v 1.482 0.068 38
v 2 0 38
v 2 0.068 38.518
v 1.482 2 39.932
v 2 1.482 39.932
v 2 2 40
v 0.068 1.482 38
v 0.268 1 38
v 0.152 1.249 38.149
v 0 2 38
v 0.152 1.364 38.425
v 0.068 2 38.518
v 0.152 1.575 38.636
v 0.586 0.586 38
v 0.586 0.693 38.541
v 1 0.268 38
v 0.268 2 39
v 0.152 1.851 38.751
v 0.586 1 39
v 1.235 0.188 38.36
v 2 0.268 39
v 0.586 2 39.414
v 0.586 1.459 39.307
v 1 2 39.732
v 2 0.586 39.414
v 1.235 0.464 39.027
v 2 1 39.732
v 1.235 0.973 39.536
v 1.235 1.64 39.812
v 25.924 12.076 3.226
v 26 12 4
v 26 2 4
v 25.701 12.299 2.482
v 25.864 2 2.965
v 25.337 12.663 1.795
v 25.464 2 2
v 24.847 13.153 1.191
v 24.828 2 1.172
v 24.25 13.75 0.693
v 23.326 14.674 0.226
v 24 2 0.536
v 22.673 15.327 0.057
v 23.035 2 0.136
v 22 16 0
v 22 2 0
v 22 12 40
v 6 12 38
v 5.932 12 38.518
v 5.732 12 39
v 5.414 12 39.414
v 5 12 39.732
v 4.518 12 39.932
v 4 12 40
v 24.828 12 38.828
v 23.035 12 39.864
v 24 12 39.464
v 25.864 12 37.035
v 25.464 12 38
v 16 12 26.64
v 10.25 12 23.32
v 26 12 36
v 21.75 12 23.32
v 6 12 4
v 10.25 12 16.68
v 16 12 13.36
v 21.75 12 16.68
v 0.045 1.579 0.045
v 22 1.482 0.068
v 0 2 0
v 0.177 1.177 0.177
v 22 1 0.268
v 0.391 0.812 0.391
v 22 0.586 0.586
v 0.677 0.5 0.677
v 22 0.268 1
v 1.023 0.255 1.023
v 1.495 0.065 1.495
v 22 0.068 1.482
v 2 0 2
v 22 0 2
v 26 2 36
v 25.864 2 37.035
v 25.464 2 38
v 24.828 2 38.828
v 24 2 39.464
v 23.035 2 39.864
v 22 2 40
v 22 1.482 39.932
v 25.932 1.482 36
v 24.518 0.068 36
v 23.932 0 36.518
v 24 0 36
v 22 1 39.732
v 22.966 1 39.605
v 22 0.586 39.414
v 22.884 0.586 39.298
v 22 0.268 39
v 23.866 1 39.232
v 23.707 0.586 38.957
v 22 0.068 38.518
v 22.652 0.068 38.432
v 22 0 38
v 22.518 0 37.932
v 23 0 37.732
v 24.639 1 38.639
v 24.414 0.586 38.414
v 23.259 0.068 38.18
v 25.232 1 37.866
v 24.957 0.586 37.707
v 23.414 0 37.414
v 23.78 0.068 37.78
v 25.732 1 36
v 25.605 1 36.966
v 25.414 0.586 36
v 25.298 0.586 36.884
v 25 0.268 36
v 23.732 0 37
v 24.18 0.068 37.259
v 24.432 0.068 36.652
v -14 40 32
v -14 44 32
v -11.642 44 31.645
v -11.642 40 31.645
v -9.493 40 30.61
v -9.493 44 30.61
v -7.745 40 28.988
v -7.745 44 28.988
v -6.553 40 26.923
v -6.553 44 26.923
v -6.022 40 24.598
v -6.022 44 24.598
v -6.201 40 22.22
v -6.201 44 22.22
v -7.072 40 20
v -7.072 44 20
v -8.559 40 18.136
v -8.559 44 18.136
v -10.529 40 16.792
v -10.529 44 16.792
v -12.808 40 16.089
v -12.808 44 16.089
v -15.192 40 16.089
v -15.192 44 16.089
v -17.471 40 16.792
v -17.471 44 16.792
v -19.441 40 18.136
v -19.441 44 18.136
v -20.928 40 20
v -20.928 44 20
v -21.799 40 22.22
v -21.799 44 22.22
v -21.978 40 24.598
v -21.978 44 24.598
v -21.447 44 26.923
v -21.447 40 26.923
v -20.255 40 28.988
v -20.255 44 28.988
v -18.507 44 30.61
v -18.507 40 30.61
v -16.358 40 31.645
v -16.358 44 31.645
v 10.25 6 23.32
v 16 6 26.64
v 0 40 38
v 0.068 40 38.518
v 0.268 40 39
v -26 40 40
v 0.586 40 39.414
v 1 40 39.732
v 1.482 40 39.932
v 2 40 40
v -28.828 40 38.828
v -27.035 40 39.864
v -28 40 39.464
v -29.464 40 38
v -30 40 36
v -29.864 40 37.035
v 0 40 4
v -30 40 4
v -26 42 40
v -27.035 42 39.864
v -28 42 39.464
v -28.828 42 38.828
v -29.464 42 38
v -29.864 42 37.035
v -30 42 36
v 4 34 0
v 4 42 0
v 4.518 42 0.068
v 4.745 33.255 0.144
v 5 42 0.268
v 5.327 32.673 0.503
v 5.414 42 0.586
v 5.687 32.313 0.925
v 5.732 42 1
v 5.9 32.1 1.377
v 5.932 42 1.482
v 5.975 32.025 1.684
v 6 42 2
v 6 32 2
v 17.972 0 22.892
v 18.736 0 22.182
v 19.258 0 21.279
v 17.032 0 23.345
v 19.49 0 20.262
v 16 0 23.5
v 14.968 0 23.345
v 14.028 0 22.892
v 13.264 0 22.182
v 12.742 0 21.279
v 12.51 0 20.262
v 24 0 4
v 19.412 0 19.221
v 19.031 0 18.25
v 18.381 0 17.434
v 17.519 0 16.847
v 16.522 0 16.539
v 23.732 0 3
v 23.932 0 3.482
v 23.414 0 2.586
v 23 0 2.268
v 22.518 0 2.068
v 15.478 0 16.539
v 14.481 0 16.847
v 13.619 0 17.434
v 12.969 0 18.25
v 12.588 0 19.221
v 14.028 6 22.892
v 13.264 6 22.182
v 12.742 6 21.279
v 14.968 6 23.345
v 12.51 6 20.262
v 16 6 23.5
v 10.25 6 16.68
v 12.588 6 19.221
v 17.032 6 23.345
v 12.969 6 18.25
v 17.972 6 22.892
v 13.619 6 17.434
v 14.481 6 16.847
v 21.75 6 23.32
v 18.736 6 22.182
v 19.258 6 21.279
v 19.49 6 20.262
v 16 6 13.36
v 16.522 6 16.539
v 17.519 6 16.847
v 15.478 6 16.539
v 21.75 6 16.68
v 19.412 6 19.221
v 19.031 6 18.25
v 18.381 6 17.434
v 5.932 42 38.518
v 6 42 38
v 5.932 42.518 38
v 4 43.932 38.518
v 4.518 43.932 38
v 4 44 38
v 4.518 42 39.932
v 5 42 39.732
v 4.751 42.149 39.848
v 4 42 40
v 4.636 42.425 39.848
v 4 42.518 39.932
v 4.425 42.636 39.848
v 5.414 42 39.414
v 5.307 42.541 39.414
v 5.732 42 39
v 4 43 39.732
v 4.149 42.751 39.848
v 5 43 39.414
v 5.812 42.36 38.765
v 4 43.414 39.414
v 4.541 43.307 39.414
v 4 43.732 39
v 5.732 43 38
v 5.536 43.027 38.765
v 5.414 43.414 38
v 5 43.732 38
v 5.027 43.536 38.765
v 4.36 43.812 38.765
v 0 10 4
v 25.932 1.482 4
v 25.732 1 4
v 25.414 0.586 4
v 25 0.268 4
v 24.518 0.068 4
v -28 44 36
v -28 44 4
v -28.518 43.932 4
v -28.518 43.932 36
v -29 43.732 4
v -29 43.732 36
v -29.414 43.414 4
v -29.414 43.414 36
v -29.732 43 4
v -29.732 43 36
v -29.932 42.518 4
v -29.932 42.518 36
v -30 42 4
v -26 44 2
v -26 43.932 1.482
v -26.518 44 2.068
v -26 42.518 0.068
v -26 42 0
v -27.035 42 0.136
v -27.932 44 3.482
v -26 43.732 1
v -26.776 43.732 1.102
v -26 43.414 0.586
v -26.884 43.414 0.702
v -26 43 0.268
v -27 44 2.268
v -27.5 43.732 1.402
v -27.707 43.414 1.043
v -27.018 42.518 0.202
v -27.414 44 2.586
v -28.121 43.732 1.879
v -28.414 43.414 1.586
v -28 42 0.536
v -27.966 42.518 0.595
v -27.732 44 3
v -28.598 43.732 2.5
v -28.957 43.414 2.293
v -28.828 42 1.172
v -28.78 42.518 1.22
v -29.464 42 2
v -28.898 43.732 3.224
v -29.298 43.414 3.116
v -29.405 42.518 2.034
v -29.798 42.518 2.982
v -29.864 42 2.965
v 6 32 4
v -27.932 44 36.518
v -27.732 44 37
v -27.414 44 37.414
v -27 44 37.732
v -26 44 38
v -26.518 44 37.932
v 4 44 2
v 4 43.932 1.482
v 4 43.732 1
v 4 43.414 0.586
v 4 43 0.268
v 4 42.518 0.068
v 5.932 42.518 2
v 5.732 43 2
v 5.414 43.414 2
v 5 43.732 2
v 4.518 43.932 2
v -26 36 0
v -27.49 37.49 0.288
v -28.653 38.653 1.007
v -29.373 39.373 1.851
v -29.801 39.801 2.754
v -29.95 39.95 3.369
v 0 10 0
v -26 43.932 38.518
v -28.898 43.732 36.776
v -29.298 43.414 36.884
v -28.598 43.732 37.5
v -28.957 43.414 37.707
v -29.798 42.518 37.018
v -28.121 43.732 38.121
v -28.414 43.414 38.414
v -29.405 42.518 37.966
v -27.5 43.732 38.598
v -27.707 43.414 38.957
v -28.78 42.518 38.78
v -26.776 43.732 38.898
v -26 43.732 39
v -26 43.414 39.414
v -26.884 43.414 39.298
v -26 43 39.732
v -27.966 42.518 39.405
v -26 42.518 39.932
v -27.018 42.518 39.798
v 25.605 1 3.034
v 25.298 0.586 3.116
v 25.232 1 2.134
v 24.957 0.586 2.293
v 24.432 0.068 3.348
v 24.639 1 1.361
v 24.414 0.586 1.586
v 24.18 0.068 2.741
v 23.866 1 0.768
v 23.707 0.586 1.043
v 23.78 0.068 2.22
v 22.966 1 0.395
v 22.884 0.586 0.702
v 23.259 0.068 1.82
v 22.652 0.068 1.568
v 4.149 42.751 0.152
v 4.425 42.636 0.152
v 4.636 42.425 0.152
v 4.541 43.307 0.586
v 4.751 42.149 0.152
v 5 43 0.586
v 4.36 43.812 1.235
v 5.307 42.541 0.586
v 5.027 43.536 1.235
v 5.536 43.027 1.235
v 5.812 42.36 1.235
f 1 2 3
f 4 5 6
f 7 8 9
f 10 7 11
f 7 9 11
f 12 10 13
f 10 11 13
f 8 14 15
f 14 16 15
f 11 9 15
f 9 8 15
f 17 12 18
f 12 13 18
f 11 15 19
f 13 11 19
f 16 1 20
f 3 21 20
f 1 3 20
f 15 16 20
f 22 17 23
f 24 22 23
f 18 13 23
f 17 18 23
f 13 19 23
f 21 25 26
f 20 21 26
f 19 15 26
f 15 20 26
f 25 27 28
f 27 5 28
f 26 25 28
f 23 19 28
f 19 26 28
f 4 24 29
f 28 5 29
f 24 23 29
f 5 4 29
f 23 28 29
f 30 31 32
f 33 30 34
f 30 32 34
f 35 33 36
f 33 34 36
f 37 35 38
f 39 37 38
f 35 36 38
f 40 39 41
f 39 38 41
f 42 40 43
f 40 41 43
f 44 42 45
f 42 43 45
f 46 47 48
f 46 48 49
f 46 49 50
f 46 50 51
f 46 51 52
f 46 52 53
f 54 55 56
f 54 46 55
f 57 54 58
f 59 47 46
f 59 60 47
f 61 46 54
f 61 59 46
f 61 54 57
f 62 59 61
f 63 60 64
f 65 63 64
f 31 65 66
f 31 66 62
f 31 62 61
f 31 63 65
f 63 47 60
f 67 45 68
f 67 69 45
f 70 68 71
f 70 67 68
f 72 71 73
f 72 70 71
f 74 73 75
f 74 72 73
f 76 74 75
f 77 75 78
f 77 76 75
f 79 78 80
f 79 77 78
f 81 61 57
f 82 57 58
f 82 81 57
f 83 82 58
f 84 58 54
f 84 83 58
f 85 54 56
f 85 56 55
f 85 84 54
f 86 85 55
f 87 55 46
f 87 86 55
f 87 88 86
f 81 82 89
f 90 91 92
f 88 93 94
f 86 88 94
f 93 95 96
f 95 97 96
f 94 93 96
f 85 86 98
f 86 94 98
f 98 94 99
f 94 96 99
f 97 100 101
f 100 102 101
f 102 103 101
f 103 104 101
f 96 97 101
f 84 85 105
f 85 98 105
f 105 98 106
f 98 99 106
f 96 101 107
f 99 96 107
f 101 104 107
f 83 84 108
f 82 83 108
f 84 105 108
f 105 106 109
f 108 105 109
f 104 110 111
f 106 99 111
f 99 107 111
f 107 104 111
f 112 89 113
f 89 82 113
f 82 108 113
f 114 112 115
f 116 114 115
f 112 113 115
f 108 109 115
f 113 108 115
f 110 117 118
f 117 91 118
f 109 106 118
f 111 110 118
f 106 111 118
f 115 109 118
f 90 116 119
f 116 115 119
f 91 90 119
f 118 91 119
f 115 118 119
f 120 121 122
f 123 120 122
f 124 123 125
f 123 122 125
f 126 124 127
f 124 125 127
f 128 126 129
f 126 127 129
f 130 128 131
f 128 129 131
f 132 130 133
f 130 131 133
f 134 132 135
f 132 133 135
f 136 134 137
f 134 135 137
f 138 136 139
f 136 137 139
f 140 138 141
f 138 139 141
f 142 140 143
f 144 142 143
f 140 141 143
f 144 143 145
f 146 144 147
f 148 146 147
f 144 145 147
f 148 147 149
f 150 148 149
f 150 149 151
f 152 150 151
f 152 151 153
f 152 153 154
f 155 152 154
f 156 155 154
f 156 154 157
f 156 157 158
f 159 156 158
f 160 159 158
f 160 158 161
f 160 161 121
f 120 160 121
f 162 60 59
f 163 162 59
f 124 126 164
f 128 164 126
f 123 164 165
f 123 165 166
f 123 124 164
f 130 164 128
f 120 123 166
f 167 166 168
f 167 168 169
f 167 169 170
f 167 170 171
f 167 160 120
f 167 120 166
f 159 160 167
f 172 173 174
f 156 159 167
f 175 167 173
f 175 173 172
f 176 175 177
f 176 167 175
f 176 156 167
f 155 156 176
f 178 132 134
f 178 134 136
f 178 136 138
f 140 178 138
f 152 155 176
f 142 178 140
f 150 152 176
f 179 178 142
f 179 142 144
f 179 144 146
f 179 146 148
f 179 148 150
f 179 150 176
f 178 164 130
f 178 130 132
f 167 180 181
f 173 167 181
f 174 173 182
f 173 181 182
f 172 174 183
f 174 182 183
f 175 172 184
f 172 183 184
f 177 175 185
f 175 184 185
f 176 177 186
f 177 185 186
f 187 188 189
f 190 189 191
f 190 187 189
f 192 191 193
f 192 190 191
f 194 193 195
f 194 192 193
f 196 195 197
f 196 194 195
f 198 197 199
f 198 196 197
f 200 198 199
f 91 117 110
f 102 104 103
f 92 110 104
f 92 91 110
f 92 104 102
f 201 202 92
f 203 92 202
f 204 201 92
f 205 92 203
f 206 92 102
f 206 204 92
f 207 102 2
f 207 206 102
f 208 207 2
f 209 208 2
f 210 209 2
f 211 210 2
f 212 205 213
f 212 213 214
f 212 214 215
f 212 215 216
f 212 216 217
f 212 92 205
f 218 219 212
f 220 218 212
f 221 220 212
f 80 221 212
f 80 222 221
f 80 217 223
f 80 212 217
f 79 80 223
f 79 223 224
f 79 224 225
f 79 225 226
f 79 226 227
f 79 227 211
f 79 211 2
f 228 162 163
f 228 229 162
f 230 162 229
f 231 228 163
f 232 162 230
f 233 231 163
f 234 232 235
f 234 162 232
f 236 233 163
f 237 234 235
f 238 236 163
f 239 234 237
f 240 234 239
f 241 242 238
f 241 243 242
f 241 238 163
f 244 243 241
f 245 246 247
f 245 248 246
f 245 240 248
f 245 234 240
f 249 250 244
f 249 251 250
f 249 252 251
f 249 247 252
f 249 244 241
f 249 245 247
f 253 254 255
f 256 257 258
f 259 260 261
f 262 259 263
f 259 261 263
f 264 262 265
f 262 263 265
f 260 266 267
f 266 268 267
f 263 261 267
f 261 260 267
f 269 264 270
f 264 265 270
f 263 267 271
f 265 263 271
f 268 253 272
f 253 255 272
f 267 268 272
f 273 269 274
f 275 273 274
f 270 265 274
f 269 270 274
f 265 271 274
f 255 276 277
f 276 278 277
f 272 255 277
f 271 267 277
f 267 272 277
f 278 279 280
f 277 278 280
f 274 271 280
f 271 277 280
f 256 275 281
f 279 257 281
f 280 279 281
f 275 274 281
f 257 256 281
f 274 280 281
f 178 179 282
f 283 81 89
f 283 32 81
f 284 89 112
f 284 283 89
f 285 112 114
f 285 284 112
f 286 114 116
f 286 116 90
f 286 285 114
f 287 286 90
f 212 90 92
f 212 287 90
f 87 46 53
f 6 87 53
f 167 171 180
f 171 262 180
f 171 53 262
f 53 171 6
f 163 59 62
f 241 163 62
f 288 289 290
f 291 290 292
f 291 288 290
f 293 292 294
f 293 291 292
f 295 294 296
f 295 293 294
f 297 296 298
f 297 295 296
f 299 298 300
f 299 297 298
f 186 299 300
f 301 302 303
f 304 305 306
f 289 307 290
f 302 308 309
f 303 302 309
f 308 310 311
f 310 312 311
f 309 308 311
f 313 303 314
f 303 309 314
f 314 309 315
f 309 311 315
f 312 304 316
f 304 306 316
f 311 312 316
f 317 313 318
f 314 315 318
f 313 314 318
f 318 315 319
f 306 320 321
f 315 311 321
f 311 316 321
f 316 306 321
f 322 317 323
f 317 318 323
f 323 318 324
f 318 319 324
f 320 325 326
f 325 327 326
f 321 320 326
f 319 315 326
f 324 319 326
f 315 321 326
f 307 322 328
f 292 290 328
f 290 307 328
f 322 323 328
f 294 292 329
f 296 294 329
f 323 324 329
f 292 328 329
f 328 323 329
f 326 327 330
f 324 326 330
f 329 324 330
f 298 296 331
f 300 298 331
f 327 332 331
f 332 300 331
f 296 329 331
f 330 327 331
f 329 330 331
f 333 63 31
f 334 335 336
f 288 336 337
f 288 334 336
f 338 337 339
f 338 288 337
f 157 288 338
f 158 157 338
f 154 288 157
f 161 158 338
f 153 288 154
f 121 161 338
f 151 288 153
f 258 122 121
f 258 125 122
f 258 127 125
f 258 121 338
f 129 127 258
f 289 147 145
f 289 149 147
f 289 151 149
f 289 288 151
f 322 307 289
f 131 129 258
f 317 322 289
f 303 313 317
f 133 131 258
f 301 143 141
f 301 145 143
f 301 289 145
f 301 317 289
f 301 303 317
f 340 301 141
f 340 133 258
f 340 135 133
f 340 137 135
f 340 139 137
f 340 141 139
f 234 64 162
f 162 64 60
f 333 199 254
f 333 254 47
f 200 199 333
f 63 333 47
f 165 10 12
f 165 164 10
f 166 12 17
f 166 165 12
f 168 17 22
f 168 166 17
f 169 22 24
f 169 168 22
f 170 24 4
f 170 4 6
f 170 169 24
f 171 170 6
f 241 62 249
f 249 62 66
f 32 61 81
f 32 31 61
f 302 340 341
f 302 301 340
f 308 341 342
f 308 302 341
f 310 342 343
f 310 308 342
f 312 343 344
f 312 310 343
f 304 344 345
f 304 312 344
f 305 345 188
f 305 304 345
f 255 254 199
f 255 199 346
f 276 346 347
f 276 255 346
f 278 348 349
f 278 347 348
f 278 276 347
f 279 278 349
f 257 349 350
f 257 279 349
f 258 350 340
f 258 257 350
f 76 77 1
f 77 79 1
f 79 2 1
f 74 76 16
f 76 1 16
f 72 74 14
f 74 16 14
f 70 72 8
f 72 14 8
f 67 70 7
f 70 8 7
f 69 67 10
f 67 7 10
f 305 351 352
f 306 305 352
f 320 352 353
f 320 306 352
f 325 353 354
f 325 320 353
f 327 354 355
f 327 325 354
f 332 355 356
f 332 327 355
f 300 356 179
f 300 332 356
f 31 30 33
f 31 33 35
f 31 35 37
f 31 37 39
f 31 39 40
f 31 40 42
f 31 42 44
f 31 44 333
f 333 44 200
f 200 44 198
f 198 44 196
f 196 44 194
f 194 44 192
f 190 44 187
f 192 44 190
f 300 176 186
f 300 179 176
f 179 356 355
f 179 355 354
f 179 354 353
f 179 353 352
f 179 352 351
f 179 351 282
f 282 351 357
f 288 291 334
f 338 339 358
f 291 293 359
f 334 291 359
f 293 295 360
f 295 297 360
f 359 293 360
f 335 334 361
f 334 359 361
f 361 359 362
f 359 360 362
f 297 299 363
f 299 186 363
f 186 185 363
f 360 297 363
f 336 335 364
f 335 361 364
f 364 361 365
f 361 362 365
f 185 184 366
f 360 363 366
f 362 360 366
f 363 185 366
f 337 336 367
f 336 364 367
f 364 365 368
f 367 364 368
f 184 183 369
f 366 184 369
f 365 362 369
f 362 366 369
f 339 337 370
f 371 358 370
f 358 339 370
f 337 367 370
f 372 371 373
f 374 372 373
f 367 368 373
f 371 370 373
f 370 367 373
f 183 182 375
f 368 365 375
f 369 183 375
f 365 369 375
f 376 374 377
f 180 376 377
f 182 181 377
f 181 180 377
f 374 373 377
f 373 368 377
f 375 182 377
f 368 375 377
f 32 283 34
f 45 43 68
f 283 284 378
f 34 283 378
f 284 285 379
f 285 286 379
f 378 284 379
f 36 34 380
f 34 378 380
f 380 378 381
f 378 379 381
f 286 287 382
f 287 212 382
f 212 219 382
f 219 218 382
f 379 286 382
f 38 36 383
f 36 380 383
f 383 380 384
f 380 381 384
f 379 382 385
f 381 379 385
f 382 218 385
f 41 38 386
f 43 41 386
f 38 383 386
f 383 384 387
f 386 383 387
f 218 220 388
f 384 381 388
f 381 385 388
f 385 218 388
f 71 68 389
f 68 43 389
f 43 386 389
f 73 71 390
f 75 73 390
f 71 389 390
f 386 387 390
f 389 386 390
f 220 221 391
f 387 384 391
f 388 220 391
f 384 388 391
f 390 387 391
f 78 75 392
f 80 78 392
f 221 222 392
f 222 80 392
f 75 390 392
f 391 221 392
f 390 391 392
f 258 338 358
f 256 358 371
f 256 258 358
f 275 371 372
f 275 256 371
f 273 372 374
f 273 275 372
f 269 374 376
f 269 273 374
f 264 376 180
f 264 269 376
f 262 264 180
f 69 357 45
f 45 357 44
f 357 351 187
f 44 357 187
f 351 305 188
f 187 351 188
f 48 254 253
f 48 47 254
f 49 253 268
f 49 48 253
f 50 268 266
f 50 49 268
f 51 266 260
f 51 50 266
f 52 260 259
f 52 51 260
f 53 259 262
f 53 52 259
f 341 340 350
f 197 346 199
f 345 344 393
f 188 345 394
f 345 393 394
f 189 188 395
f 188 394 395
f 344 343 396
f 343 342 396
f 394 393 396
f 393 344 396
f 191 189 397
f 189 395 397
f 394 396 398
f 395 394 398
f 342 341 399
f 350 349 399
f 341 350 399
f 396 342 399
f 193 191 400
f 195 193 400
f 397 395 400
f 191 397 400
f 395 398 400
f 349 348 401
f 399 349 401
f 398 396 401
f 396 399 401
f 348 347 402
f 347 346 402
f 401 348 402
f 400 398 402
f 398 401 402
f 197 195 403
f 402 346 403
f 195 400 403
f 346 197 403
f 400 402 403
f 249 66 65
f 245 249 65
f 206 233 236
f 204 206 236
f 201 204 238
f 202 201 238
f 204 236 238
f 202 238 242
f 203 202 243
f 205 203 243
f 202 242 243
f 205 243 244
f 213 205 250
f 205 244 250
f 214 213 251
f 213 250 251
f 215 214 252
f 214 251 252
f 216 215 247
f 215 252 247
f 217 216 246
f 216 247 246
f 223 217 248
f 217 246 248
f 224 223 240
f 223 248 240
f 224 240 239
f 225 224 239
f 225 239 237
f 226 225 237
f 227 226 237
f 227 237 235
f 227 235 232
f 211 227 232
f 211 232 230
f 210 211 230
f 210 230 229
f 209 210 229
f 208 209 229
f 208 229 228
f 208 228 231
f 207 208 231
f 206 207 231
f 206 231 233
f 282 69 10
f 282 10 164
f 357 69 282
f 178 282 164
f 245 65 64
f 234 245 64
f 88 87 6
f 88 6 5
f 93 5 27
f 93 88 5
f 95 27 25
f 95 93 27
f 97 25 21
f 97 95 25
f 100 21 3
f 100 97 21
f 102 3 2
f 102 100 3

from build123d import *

# Parameters (mm, degrees)
BOSS_EXTRUDE1_DEPTH = 40
SKETCH3_R           = 3.5
CUT_EXTRUDE1_DEPTH  = 32
SKETCH2_R           = 8
CUT_EXTRUDE2_DEPTH  = 32
CUT_EXTRUDE3_DEPTH  = 6
BOSS_EXTRUDE3_DEPTH = 4
FILLET1_R           = 4
FILLET4_R           = 2


with BuildPart() as part:
    # Sketch1 → Boss-Extrude1 (new body)
    with BuildSketch(Plane.XY):
        Polygon((0, 0), (0, 40), (-30, 40), (-30, 44), (6, 44), (6, 12), (26, 12), (26, 0), align=None)
    extrude(amount=BOSS_EXTRUDE1_DEPTH)

    # Sketch3 → Cut-Extrude1 (cut)
    with BuildSketch(Plane(origin=(0, 12, 0), x_dir=(1, 0, 0), z_dir=(0, 1, 0))):
        with Locations(Location((16, -20, 0), (0, 0, 270))):
            Circle(SKETCH3_R)
    extrude(amount=-CUT_EXTRUDE1_DEPTH, mode=Mode.SUBTRACT)

    # Sketch2 → Cut-Extrude2 (cut)
    with BuildSketch(Plane(origin=(0, 44, 0), x_dir=(1, 0, 0), z_dir=(0, 1, 0))):
        with Locations(Location((-14, -24, 0), (0, 0, 270))):
            Circle(SKETCH2_R)
    extrude(amount=-CUT_EXTRUDE2_DEPTH, mode=Mode.SUBTRACT)

    # Sketch4 → Cut-Extrude3 (cut)
    with BuildSketch(Plane(origin=(0, 12, 0), x_dir=(1, 0, 0), z_dir=(0, 1, 0))):
        Polygon((16, -26.639528096), (21.75, -23.319764048), (21.75, -16.680235952), (16, -13.360471904), (10.25, -16.680235952), (10.25, -23.319764048), align=None)
    extrude(amount=-CUT_EXTRUDE3_DEPTH, mode=Mode.SUBTRACT)

    # Sketch5 → Boss-Extrude3 (add)
    with BuildSketch(Plane(origin=(0, 0, 0), x_dir=(-1, 0, 0), z_dir=(0, 0, -1))):
        Polygon((-26, 12), (-6, 32), (-6, 12), align=None)
        Polygon((0, 10), (0, 40), (30, 40), align=None)
    extrude(amount=-BOSS_EXTRUDE3_DEPTH)

    # Fillet1
    fillet1_edges = [part.edges().sort_by_distance(p)[0] for p in [
        (26, 6, 0),
        (-30, 42, 40),
        (26, 6, 40),
        (-30, 42, 0),
    ]]
    fillet(fillet1_edges, radius=FILLET1_R)

    # Fillet4
    fillet4_edges = [part.edges().sort_by_distance(p)[0] for p in [
        (11, 0, 0),
        (0, 0, 20),
        (6, 44, 20),
        (6, 28, 40),
        (-10, 44, 40),
        (0, 20, 40),
        (11, 0, 40),
        (6, 38, 0),
        (26, 0, 20),
        (24.828427125, 0, 1.171572875),
        (24.828427125, 0, 38.828427125),
        (-30, 44, 20),
        (-28.828427125, 44, 1.171572875),
        (-28.828427125, 44, 38.828427125),
        (-10, 44, 0),
    ]]
    fillet(fillet4_edges, radius=FILLET4_R)


solid = part.part
